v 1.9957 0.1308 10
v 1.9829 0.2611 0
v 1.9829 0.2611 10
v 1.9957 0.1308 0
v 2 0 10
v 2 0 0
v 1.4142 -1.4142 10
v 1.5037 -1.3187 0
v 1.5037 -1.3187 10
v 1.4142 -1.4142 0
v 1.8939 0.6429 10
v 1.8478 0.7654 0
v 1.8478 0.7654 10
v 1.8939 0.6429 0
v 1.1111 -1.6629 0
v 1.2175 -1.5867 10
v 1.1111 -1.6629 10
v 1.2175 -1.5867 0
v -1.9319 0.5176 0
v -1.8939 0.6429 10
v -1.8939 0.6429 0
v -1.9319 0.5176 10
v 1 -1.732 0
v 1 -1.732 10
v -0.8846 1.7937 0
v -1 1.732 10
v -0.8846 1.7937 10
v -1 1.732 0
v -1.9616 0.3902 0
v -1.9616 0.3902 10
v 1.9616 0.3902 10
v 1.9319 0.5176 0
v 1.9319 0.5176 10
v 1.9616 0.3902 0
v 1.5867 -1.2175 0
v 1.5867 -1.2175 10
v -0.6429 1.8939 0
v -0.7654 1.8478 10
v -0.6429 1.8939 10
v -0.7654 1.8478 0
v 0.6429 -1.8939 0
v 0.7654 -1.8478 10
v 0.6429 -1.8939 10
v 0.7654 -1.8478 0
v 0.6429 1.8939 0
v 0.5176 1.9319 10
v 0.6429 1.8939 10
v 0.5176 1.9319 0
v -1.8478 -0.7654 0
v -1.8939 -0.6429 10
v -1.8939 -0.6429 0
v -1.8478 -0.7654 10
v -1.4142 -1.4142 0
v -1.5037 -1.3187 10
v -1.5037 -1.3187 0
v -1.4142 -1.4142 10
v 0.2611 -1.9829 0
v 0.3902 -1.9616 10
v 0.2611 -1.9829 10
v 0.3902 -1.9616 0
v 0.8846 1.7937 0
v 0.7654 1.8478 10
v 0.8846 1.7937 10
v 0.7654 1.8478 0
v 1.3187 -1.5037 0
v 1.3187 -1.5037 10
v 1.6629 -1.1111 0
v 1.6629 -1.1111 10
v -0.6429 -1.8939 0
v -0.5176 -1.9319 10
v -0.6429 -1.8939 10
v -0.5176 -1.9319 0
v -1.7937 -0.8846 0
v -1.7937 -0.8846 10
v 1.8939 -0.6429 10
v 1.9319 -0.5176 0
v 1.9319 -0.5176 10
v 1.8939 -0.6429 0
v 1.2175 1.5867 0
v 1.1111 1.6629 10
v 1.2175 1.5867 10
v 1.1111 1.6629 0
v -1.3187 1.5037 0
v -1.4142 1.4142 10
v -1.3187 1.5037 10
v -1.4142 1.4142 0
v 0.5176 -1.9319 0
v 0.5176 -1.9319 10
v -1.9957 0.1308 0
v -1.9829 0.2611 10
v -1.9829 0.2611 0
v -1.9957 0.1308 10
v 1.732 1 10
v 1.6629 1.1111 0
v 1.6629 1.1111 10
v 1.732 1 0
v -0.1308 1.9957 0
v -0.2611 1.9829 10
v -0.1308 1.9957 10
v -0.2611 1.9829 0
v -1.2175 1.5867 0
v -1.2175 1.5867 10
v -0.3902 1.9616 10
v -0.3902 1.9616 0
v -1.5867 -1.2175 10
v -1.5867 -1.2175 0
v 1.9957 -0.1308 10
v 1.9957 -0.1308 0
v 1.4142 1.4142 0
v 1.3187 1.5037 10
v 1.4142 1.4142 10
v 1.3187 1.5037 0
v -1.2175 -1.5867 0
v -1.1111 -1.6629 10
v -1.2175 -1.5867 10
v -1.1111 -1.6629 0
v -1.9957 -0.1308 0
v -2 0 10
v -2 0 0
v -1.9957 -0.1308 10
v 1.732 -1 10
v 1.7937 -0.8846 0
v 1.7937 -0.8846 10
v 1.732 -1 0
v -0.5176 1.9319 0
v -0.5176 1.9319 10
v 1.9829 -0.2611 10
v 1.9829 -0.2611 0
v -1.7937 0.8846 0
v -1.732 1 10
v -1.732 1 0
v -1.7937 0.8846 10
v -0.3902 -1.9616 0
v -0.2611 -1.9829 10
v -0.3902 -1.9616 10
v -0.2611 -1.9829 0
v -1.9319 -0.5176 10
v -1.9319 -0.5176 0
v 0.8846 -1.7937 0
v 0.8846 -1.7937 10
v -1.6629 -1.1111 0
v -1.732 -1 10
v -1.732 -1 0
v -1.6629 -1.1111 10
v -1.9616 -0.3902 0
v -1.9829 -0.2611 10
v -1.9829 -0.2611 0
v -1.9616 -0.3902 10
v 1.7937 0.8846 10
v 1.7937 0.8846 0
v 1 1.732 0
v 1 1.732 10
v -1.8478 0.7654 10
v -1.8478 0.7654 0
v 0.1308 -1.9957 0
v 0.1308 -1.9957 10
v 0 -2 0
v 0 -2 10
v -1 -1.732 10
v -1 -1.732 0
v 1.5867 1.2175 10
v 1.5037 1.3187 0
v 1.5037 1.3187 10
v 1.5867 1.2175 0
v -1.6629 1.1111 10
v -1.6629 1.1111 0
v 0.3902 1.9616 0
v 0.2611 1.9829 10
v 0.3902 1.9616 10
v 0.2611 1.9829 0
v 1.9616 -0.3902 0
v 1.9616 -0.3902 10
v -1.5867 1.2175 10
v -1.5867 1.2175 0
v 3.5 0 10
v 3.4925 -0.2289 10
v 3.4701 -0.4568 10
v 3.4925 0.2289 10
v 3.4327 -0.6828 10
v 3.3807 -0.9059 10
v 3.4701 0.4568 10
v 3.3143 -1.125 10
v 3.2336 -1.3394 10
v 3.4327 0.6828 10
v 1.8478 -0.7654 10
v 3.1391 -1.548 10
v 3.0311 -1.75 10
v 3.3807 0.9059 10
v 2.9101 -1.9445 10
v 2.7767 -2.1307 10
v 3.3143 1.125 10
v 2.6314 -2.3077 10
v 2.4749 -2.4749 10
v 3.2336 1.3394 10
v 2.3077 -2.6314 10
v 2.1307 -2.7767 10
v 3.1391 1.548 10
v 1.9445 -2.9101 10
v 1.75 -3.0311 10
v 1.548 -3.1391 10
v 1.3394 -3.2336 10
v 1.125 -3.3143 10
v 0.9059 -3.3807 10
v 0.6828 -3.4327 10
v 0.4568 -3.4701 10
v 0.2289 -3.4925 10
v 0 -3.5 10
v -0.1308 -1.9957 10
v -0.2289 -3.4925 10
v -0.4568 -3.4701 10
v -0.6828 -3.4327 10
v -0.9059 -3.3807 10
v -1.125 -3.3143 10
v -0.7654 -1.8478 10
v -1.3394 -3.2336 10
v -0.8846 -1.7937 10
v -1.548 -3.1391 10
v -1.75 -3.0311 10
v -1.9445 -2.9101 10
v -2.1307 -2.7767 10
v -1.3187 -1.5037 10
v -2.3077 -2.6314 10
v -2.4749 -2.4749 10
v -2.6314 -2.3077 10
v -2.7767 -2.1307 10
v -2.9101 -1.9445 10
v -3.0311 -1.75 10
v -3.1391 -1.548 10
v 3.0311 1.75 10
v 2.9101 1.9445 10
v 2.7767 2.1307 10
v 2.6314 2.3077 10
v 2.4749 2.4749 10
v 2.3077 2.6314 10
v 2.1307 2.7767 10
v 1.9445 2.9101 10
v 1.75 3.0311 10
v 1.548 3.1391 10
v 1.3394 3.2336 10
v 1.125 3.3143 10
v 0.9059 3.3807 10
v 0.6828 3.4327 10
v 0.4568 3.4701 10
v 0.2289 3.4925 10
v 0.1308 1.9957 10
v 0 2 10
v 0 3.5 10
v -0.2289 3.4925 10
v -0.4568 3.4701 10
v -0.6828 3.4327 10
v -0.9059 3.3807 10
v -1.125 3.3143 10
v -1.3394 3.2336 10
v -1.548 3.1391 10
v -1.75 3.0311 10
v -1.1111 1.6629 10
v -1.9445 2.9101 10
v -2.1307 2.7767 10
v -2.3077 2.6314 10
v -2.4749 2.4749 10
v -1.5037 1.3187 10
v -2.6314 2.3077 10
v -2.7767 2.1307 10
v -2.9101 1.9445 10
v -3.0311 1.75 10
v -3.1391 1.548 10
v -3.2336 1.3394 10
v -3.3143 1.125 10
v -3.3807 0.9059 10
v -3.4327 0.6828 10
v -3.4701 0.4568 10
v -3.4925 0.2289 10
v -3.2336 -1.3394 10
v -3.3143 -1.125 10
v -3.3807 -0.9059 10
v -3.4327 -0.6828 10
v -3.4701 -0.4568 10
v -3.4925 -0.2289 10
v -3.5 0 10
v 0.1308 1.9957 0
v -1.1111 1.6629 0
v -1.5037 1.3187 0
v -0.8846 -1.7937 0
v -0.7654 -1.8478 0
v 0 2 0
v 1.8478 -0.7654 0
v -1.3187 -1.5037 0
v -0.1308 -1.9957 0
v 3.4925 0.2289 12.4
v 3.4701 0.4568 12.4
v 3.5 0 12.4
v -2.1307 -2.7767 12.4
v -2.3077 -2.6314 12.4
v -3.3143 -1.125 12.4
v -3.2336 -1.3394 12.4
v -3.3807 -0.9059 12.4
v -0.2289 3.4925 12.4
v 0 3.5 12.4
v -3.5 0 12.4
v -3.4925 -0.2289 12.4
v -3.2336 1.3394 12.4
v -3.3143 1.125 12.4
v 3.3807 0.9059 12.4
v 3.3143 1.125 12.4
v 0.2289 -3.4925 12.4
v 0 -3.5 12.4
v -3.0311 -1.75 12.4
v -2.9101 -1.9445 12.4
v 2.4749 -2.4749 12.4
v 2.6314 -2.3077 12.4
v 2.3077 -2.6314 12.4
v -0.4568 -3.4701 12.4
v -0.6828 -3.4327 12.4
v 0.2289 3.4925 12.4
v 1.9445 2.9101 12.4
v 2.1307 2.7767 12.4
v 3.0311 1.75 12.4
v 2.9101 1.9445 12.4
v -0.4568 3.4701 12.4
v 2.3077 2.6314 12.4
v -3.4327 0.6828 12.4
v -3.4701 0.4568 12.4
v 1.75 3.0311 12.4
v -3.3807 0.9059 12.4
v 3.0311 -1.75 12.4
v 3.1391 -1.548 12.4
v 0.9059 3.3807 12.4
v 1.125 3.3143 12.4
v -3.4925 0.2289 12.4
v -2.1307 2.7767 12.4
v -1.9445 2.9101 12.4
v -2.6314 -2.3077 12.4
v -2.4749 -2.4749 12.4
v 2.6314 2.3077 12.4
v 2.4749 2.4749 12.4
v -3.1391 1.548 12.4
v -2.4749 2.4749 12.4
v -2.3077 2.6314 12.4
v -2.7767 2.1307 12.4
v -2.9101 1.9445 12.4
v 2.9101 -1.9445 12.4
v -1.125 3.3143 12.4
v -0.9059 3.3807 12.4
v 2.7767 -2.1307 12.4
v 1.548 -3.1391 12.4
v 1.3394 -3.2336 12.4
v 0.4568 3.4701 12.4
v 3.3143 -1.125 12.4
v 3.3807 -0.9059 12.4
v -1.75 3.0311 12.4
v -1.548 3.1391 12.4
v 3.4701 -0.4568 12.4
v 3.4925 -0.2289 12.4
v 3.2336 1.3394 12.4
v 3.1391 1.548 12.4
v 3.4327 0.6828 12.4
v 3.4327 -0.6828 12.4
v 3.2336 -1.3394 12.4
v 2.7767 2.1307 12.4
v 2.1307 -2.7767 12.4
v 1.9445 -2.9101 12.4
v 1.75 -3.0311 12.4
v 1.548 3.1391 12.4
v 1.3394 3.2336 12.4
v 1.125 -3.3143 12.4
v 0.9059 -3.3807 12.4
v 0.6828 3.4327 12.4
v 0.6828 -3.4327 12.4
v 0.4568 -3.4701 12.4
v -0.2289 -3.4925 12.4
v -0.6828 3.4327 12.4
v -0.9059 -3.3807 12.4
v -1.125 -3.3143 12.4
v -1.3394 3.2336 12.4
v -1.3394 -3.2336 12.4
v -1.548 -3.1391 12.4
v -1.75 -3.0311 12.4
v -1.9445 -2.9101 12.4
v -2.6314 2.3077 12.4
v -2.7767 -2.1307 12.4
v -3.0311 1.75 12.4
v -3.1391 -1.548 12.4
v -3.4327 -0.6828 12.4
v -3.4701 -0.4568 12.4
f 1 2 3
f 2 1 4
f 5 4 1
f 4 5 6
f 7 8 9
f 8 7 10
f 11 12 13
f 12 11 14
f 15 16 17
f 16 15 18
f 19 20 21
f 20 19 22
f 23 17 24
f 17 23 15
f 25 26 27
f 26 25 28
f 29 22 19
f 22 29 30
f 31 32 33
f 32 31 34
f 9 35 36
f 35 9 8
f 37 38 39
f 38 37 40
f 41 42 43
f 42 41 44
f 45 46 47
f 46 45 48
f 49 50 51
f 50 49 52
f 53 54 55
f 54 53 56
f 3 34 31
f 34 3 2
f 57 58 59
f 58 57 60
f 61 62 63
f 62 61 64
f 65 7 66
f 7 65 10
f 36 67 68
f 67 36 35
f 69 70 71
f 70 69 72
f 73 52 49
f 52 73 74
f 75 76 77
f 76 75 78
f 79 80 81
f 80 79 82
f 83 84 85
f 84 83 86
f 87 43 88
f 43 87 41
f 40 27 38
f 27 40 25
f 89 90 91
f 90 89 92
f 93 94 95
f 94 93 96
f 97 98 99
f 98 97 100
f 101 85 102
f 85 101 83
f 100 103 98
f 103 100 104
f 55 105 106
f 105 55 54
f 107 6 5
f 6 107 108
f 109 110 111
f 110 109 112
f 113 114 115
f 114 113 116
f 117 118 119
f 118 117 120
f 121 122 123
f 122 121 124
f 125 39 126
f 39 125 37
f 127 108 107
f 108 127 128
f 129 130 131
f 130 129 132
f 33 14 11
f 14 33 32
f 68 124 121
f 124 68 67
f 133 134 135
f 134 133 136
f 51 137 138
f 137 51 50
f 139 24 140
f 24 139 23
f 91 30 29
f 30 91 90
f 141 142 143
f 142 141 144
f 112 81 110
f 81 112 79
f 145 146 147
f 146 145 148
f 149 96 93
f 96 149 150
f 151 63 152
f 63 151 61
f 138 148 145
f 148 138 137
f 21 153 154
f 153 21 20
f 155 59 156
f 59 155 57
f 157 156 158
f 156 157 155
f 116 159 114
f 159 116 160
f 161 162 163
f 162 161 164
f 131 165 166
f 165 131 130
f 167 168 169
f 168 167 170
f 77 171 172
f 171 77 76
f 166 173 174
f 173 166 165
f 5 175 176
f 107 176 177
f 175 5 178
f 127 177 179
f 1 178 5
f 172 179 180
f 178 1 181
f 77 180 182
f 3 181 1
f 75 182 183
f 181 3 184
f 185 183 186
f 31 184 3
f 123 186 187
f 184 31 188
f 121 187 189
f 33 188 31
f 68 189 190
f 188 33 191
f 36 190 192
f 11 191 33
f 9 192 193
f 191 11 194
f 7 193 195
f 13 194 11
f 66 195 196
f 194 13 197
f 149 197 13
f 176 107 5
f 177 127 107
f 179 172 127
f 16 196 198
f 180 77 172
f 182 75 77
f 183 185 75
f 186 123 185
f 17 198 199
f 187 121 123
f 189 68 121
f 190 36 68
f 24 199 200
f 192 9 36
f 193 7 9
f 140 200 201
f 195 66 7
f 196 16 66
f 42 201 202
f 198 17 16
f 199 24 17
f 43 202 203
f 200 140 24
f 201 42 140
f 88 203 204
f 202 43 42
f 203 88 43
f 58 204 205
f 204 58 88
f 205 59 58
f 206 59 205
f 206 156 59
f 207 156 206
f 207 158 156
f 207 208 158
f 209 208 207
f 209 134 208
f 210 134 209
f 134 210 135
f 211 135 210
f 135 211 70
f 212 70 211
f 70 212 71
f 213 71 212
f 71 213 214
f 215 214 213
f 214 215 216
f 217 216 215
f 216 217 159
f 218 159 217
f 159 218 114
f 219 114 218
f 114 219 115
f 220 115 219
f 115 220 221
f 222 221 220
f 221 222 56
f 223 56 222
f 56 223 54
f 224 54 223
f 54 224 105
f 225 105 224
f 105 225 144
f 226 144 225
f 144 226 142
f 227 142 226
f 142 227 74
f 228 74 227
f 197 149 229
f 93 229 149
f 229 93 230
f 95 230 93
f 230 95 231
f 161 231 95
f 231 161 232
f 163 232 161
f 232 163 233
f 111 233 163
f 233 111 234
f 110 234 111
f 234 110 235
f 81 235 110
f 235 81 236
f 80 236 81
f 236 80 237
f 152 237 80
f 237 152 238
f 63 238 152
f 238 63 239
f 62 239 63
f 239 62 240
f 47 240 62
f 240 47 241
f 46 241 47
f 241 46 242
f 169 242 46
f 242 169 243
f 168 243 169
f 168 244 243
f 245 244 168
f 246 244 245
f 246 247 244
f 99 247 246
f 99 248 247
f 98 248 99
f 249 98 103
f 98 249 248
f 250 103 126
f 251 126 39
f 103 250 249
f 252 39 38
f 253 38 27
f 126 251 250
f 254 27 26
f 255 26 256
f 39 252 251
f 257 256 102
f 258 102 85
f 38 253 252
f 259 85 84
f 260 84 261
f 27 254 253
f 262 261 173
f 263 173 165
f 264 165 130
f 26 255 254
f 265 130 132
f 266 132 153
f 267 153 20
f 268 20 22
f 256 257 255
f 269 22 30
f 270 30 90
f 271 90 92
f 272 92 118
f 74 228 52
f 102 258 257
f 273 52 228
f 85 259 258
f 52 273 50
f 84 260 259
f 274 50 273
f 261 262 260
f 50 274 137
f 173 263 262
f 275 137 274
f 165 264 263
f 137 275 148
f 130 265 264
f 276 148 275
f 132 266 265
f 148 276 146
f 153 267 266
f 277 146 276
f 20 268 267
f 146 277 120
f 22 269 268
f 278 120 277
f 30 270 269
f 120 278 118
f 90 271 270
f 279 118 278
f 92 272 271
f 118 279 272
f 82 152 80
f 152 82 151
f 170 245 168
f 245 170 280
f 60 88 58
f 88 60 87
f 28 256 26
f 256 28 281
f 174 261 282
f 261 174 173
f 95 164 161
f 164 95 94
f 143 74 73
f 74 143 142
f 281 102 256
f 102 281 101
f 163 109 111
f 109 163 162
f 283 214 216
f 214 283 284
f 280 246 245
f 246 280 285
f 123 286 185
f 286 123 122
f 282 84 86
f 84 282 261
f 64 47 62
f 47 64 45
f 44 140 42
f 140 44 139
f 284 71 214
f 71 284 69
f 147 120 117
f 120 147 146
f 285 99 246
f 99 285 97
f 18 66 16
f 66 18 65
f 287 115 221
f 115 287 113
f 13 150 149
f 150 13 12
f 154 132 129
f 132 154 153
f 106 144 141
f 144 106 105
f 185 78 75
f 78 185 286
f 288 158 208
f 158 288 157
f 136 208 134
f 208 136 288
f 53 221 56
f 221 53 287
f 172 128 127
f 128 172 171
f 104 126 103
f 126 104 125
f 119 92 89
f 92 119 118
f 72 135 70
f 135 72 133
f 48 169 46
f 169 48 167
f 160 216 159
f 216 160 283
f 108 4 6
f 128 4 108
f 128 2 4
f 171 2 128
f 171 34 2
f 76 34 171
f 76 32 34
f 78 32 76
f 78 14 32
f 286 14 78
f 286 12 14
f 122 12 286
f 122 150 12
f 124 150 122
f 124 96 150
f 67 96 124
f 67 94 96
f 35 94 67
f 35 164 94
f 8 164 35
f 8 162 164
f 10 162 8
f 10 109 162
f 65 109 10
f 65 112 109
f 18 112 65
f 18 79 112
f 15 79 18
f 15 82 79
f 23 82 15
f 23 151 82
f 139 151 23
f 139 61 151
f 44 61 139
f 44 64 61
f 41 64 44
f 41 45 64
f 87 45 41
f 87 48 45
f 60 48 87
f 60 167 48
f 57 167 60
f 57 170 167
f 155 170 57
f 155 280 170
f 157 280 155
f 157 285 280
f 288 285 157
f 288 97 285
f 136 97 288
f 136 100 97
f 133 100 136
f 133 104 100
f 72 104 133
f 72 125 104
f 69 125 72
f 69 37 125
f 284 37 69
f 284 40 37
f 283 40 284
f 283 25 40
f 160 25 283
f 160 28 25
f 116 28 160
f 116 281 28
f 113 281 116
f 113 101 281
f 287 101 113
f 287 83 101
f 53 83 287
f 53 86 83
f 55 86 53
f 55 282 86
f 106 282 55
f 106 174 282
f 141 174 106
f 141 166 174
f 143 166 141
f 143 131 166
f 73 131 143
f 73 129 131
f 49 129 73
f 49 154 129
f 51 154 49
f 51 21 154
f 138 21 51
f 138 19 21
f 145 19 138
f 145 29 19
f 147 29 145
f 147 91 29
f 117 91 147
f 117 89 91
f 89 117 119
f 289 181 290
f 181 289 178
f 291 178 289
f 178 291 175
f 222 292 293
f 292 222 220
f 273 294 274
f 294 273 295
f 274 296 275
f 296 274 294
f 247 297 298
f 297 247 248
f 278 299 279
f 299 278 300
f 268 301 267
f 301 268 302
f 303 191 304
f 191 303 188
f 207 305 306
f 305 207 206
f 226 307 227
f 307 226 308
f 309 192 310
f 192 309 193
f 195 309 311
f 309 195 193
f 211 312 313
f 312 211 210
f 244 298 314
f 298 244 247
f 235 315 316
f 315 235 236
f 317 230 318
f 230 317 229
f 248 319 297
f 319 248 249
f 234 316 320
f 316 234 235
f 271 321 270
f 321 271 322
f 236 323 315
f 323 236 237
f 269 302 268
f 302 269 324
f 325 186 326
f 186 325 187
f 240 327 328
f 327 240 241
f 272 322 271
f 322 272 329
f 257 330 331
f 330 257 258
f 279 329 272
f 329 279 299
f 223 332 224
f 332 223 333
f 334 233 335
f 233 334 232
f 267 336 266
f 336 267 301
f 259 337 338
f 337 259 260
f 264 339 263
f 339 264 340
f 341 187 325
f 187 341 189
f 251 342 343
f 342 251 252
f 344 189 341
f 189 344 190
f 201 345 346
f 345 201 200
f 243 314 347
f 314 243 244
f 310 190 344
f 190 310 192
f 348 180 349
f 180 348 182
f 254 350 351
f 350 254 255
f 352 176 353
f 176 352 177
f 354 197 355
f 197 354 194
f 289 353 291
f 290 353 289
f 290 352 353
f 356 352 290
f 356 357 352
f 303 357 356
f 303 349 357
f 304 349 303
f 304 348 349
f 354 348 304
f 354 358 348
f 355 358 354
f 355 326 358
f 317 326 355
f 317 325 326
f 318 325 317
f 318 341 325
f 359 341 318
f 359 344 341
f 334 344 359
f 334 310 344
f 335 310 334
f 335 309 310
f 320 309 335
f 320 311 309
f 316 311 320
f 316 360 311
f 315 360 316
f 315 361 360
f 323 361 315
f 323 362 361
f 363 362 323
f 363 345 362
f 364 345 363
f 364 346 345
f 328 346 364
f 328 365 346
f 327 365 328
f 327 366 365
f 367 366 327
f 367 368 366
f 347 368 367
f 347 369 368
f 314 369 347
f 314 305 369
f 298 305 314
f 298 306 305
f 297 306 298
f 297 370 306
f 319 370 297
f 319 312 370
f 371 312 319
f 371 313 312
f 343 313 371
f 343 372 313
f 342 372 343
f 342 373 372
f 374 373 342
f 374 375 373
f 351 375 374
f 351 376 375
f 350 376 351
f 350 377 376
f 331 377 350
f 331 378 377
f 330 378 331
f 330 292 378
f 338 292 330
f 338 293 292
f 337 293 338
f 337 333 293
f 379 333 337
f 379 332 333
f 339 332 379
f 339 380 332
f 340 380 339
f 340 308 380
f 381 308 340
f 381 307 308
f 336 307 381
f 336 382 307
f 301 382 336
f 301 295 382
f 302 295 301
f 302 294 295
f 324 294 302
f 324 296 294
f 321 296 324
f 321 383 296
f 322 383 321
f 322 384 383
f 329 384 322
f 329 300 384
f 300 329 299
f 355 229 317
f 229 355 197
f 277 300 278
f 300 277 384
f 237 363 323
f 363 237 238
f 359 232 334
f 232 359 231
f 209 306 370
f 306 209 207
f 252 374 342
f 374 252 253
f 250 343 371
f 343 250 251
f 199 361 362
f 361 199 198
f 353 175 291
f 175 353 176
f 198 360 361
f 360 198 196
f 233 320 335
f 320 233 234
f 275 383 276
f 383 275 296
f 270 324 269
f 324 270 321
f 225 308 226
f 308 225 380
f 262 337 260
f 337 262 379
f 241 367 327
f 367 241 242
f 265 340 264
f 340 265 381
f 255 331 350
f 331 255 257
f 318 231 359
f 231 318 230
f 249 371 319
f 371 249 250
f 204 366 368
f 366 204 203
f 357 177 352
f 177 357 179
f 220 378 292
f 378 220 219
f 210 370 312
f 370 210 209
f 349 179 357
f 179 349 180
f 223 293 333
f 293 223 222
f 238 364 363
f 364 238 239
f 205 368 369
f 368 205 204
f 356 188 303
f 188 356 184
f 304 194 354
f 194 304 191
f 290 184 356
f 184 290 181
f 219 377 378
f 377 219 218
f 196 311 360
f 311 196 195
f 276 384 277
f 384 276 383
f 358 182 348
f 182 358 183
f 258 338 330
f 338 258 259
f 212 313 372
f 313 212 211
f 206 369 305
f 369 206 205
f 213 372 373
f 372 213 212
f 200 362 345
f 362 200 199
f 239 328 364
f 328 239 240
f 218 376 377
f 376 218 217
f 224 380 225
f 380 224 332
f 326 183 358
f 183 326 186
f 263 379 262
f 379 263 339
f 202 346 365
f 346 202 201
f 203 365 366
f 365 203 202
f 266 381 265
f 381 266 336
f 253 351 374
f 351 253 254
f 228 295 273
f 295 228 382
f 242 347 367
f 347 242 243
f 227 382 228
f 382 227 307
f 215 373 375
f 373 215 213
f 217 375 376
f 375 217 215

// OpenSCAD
$fn = 96;

shaft_d = 4.0;
head_d  = 7.0;
head_h  = 2.4;
len     = 10.0;

module screw_simple(shaft_d, head_d, head_h, len) {
    union() {
        // Shaft
        cylinder(d = shaft_d, h = len);

        // Head (simple cylindrical head)
        translate([0,0,len])
            cylinder(d = head_d, h = head_h);
    }
}

screw_simple(shaft_d, head_d, head_h, len);
